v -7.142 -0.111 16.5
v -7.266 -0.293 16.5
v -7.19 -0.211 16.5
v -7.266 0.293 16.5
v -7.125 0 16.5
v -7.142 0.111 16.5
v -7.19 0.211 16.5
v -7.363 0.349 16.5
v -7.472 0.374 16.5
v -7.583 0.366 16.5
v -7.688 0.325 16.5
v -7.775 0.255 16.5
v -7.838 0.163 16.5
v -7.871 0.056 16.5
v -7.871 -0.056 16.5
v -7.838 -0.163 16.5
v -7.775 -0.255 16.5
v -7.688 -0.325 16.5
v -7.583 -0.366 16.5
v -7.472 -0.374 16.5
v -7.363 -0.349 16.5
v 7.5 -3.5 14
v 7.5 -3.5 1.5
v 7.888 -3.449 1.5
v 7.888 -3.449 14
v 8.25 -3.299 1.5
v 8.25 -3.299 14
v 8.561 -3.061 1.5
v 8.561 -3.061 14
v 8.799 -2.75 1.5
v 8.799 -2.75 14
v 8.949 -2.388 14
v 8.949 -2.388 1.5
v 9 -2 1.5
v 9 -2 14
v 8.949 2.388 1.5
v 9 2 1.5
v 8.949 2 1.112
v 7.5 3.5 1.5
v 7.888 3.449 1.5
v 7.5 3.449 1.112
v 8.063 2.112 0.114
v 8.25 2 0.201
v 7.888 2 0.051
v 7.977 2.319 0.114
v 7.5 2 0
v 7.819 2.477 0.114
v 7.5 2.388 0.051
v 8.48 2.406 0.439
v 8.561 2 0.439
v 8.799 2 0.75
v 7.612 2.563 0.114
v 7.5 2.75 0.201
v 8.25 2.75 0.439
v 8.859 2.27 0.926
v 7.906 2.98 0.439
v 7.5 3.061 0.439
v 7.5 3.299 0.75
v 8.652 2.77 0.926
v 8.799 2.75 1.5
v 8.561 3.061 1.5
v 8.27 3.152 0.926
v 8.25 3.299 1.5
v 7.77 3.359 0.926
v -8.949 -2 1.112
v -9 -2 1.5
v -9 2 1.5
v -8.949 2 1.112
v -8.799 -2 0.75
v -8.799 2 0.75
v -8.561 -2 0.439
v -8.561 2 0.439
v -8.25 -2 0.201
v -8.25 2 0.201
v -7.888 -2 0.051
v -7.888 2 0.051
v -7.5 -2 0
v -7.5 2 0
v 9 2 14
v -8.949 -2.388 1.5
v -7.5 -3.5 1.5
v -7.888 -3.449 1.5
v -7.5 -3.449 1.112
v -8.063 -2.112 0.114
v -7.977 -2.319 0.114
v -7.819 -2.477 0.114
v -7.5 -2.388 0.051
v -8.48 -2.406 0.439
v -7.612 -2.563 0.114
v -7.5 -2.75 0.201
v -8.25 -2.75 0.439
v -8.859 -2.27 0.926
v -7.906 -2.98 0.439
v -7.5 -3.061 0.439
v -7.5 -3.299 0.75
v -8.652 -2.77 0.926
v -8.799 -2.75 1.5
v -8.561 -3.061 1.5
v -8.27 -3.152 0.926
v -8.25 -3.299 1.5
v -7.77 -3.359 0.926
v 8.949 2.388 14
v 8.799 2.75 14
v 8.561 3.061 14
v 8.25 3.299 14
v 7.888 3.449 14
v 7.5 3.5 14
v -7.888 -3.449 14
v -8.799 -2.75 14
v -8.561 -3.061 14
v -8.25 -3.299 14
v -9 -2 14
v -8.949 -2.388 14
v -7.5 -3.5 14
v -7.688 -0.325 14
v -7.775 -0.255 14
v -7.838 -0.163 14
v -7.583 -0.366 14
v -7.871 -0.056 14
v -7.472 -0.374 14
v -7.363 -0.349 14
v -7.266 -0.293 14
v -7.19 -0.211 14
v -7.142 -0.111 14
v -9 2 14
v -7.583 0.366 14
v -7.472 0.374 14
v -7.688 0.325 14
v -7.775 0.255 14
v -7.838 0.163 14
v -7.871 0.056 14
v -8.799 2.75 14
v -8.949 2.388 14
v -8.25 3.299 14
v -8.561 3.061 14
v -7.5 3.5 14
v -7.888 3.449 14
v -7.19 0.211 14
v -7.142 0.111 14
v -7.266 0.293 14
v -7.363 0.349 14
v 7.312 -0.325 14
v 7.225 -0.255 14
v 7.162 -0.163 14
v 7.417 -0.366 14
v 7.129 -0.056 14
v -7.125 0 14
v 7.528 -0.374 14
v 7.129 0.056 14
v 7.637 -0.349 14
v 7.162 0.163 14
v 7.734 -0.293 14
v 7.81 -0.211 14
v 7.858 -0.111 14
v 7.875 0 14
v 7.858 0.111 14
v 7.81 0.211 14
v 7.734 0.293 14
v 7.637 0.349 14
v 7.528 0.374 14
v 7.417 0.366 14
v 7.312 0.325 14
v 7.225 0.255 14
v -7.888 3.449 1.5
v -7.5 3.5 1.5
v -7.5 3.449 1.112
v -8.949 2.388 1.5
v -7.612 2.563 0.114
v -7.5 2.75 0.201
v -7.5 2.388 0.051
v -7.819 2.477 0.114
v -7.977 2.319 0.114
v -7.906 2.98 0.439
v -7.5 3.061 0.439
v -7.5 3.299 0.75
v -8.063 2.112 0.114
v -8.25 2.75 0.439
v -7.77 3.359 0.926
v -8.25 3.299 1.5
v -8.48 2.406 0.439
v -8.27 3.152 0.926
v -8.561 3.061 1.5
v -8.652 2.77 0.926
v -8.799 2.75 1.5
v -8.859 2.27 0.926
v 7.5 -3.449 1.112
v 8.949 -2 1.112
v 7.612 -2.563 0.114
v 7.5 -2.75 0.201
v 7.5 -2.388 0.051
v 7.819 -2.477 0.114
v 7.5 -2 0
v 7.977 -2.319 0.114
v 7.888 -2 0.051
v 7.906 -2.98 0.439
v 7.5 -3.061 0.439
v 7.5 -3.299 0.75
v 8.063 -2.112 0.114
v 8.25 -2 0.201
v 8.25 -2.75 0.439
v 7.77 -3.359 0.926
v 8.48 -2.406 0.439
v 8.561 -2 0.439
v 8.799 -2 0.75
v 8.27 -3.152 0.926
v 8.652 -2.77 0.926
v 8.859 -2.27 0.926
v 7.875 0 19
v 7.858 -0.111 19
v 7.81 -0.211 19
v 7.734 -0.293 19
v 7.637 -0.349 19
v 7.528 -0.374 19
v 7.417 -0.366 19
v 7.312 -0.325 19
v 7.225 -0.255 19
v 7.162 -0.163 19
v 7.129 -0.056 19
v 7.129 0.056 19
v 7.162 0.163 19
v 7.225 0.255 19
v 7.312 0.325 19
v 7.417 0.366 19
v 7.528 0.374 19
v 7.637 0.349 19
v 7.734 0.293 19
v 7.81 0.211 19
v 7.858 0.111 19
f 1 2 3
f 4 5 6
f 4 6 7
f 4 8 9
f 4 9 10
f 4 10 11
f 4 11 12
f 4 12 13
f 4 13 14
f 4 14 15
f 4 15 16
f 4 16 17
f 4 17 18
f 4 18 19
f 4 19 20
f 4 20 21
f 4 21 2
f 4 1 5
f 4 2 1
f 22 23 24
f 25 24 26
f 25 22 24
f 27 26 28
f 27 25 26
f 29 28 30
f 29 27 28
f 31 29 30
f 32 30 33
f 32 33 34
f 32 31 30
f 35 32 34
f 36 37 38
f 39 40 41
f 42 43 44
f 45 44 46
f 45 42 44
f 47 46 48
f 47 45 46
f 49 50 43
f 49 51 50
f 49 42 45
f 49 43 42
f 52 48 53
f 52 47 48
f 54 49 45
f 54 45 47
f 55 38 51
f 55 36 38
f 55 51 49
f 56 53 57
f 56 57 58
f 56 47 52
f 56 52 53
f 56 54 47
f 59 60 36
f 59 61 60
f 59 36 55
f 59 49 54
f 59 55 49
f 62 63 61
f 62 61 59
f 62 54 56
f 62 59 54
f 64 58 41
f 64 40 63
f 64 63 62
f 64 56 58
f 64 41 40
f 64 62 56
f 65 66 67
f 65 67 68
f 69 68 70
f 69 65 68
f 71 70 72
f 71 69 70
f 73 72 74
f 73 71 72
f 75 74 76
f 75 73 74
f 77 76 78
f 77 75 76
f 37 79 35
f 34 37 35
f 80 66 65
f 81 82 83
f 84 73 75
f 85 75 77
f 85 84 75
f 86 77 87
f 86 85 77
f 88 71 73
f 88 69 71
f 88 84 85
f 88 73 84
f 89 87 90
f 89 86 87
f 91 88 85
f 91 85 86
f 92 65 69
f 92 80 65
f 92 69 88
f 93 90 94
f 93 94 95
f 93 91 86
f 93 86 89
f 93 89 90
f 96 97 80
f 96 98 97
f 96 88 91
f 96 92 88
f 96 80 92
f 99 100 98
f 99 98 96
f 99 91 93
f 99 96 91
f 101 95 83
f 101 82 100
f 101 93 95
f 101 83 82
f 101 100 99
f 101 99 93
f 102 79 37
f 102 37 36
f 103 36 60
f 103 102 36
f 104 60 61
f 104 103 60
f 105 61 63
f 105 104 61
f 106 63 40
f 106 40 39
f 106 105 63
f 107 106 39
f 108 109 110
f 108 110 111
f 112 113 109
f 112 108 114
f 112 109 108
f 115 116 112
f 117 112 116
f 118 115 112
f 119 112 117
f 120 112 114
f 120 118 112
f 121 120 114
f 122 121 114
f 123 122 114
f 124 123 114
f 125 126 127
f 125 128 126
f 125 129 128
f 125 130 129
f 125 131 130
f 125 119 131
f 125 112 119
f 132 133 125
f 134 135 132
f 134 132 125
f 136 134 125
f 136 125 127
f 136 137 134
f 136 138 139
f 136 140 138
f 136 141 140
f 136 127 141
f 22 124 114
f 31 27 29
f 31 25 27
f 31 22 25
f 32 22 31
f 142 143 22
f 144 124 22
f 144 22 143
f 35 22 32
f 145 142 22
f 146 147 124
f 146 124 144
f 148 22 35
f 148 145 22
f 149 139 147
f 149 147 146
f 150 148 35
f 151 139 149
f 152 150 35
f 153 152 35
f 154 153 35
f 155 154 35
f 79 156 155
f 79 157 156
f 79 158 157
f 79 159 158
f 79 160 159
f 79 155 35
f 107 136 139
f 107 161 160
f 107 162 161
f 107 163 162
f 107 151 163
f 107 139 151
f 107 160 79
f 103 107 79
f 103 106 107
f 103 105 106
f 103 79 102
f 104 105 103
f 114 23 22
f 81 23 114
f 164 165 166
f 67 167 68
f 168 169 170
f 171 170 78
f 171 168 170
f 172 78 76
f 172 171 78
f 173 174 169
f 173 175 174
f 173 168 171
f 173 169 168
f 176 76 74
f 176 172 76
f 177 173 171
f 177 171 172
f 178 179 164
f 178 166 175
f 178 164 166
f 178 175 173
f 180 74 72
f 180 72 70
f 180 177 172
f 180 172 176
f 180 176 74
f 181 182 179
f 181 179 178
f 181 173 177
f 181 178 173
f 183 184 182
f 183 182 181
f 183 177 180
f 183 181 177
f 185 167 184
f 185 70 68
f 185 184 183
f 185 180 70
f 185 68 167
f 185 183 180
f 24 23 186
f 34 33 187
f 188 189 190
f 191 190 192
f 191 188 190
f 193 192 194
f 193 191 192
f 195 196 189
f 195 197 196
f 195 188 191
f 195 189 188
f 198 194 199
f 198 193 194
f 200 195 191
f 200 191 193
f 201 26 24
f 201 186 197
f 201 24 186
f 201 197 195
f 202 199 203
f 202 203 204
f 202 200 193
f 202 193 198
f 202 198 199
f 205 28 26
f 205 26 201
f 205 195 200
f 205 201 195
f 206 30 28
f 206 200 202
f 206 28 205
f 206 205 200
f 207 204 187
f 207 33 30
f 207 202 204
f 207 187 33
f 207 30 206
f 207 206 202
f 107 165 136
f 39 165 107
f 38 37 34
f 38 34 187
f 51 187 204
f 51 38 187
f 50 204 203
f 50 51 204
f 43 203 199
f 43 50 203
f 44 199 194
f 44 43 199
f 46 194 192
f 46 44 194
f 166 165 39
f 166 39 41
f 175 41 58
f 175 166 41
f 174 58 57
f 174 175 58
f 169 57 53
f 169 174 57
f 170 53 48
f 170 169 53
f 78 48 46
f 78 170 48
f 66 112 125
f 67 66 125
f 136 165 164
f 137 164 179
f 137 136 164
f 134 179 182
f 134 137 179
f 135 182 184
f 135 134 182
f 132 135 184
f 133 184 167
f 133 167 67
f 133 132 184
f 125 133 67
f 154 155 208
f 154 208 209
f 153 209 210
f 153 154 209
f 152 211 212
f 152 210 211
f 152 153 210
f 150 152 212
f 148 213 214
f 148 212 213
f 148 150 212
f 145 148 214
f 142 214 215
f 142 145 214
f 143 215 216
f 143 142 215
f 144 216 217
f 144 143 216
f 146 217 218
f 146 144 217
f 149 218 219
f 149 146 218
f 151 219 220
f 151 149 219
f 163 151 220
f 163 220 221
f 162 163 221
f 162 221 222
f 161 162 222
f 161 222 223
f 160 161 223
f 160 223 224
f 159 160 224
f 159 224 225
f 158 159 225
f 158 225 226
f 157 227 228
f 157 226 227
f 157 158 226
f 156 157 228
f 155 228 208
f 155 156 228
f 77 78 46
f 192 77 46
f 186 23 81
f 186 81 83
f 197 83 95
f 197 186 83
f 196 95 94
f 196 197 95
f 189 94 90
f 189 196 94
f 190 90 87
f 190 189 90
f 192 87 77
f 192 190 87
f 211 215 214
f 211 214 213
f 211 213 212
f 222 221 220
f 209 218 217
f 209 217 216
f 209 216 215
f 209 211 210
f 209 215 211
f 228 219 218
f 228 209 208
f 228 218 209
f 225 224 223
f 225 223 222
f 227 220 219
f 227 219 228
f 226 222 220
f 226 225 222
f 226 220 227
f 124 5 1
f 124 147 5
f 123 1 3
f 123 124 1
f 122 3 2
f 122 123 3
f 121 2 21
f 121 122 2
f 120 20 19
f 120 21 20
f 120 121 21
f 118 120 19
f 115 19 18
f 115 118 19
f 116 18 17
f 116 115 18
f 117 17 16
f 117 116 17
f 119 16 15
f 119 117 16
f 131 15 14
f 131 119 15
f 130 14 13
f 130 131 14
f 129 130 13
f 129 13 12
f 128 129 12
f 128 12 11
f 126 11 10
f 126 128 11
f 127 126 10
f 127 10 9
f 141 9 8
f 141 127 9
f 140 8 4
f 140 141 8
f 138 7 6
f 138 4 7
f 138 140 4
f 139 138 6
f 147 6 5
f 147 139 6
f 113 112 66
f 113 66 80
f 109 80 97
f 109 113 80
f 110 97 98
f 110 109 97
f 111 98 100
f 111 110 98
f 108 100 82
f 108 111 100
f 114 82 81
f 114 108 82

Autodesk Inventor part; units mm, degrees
ref_plane "YZ Plane" through (0, 0, 0) normal (1, 0, 0) x (0, 1, 0)
ref_plane "XZ Plane" through (0, 0, 0) normal (0, 1, 0) x (-1, 0, 0)
ref_plane "XY Plane" through (0, 0, 0) normal (0, 0, 1) x (1, 0, 0)
sketch "Skizze1" plane through (0, 0, 0) normal (0, 0, 1) x (1, 0, 0)
  line L0 (-9, 3.5) -> (9, 3.5)
  line L1 (9, 3.5) -> (9, -3.5)
  line L2 (9, -3.5) -> (-9, -3.5)
  line L3 (-9, -3.5) -> (-9, 3.5)
  line L4 (9, -3.5) -> (-9, 3.5) construction
  point P0 (0, 0)
  point P1 (0, 0)
  dimension "d0" = 18
  dimension "d1" = 7
extrude "Extrusion1" add sketch "Skizze1" along normal blind 14
sketch "Skizze2" plane through (0, 0, 14) normal (0, 0, 1) x (1, 0, 0)
  circle A0 centre (-7.5, 0) radius 0.375
  circle A1 centre (7.5, 0) radius 0.375
  line L0 (7.5, 0) -> (-7.5, 0) construction
  point P0 (0, 0)
  point P1 (0, 0)
  dimension "d4" = 15
  dimension "d5" = 0.75
extrude "Extrusion2" add sketch "Skizze2" along normal blind 5
fillet "Rundung1" radius 1.5 4 edges at (9, -3.5, 7) (-9, -3.5, 7) (9, 3.5, 7) (-9, 3.5, 7)
fillet "Rundung2" radius 1.5 8 edges at (-8.5607, -3.0607, 0) (-9, 0, 0) (-8.5607, 3.0607, 0) (0, 3.5, 0) (8.5607, 3.0607, 0) (9, 0, 0) (8.5607, -3.0607, 0) (0, -3.5, 0)
sketch "Skizze3" plane through (-7.5, 0, 19) normal (0, 0, 1) x (1, 0, 0)
  circle A0 centre (0, 0) radius 0.375 projected
  circle A1 centre (15, 0) radius 0.375 projected
  point P0 (7.5, 0)
extrude "Extrusion3" cut sketch "Skizze3" against normal blind 2.5 contours A0
properties part number "MKP4 0,1µF 630VDC (450377)"
